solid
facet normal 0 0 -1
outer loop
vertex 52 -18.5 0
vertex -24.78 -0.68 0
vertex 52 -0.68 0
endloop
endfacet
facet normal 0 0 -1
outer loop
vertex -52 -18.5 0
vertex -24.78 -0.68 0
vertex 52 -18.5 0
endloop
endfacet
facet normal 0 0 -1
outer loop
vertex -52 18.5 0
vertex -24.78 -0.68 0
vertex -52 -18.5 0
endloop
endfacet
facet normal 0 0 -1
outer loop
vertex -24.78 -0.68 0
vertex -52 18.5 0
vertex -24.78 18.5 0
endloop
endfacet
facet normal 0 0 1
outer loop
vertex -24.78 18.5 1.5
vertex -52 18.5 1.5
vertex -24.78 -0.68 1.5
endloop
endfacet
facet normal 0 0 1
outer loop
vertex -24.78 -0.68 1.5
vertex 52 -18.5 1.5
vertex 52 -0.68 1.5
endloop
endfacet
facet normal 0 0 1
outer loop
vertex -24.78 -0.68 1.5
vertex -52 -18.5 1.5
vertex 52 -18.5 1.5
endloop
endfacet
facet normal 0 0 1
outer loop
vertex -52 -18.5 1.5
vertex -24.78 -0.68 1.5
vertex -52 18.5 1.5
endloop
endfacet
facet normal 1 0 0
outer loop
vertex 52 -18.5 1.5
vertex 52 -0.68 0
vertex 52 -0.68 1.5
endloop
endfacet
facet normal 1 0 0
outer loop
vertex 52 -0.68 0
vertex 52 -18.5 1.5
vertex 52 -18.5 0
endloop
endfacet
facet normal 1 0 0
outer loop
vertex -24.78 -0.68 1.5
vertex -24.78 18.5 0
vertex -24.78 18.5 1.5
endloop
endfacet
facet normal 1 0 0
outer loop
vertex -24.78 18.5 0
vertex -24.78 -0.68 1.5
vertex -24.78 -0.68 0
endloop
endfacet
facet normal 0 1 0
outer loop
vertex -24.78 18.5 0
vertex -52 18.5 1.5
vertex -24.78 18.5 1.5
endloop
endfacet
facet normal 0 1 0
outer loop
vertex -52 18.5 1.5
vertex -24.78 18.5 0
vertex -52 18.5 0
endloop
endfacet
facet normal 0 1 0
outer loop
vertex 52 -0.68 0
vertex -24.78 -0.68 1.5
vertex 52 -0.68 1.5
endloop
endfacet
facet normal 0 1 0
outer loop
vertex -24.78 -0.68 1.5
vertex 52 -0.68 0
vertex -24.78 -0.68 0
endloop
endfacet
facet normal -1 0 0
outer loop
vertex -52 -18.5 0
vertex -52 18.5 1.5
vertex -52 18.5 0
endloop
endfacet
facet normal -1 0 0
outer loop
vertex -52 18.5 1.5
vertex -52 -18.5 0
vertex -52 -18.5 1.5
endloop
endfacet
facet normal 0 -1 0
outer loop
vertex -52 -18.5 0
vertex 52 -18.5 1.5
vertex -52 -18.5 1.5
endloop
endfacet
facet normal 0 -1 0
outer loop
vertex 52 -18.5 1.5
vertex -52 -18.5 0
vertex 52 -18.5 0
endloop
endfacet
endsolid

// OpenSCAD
// file: BOSL2/std.scad
// Minimal BOSL2 compatibility shim for bundled gallery models.
// It implements only the helpers used by the imported OpenSCAD projects.

CENTER = [0, 0, 0];
BOTTOM = [0, 0, -1];
TOP = [0, 0, 1];
LEFT = [-1, 0, 0];
RIGHT = [1, 0, 0];
FRONT = [0, -1, 0];
BACK = [0, 1, 0];

module up(z=0) {
    translate([0, 0, z]) children();
}

module down(z=0) {
    translate([0, 0, -z]) children();
}

module attach(anchor=CENTER) {
    children();
}

module cuboid(size=[1, 1, 1], anchor=CENTER) {
    center = anchor == CENTER;
    translate(center ? [0, 0, 0] : [0, 0, size[2] / 2])
        cube(size, center=true);
    children();
}

module xcyl(h=1, r=1, anchor=CENTER) {
    center = anchor == CENTER;
    translate(center ? [0, 0, 0] : [h / 2, 0, 0])
        rotate([0, 90, 0])
            cylinder(h=h, r=r, center=true);
}
// main file
include <BOSL2/std.scad>

// Start config
// Panel Size
panel_size = [ 104, 37 ]; // mm
// Pi Board
pi_board_size = [ 51, 21 ];                                        // mm
pi_board_screw_holes_center_from_board_edge_distance = [ 2, 4.8 ]; // mm
pi_board_screw_holes_diameter = 2.1;                               // mm
pi_board_offset = [ 1.75, -1.0 ];
pi_board_usb_size = [ 8.5, 4.5 ];
pi_board_usb_rounding_radius = 0.5; // mm
// pi_board_inset_depth = 0.2; //mm (keep at zero for final)

// Screen
screen_pcb_size = [ 100.5, 33.5, 13.3 ];                                // mm (+- 0.2) 13.3mm are pin headers.
screen_pcb_screw_holes_center_from_board_edge_distance = [ 2.25, 2.5 ]; // mm
screen_pcb_screw_holes_diameter = 2.8;                                  // mm
screen_pcb_screw_holes_spacing = [ 95, 28.5 ];                          // mm
active_screen_area = [ 76.78, 19.18 ];                                  // mm (old: 13.86)
active_screen_area_offset_from_corner = [ 11.36, 5.1 ];                 // mm
screen_rounding_radius = 0.5;                                           // mm
screen_count = 1;

// Screws
m2_screw_head_depth = 1;      // mm it's 2mm normally
m2_screw_head_diameter = 4.0; // mm (adding .6mm for tolerances)
m2_screw_nut_depth = 1;       // mm it's 1.6mm normally
m2_screw_nut_diameter = 5.0;  // mm (adding .6mm for tolerances)
m2_screw_diameter = 2.4;      // mm

// Asanoha
back_asanoha_pattern_repeat = [ 9, 3 ]; // mm
asanoha_area_rounding_radius = 3;       // mm

// Stand
stand_size = [ 3, 6, 6 ];
stand_rounding_radius = 1.5;                // mm
stand_hinge_ball_diameter = 2;              // mm
stand_hinge_ball_offset = 0;                // mm
stand_panel_tolerance = 0.25;               // mm
stand_panel_thickness = 1.5;                // mm
stand_panel_rounding_radius = 1.5;          // mm
stand_asanoha_pattern_unit_length = 10.175; // mm
stand_asanoha_repeat = [ 9, 3 ];

// Misc
walls_depth = 9.5;     // mm
walls_thickness = 1.5; // mm
panel_thickness = 1.5; // mm
rounding_radius = 1.5; // mm

resolution = 80;
// End config

module panel()
{
    cuboid([ panel_size.x, panel_size.y, panel_thickness ], rounding = rounding_radius,
           edges = [ FRONT + RIGHT, FRONT + LEFT, BACK + RIGHT, BACK + LEFT ], $fn = resolution,
           anchor = LEFT + BOTTOM + FRONT);
}

module screw_hole(thread_depth = 10, head_depth = 1.5, head_diameter = 2, thread_diameter = 1.5)
{
    translate([ 0, 0, panel_thickness - thread_depth / 2 - head_depth ])
        cylinder(h = thread_depth, r = thread_diameter / 2, center = true, $fn = resolution);
    translate([ 0, 0, panel_thickness - head_depth / 2 ])
        cylinder(h = head_depth, r = head_diameter / 2, center = true, $fn = resolution);
}

module screen_screw_set()
{
    translate([ 0, 0 ])
        screw_hole(thread_depth = panel_thickness - m2_screw_head_depth, head_depth = m2_screw_head_depth,
                   head_diameter = m2_screw_head_diameter, thread_diameter = m2_screw_diameter);
    translate([ screen_pcb_screw_holes_spacing.x, 0, 0 ])
        screw_hole(thread_depth = panel_thickness - m2_screw_head_depth, head_depth = m2_screw_head_depth,
                   head_diameter = m2_screw_head_diameter, thread_diameter = m2_screw_diameter);
    translate([ 0, screen_pcb_screw_holes_spacing.y, 0 ])
        screw_hole(thread_depth = panel_thickness - m2_screw_head_depth, head_depth = m2_screw_head_depth,
                   head_diameter = m2_screw_head_diameter, thread_diameter = m2_screw_diameter);
    translate([ screen_pcb_screw_holes_spacing.x, screen_pcb_screw_holes_spacing.y, 0 ])
        screw_hole(thread_depth = panel_thickness - m2_screw_head_depth, head_depth = m2_screw_head_depth,
                   head_diameter = m2_screw_head_diameter, thread_diameter = m2_screw_diameter);
}

module screens()
{
    screen_x_size = screen_count == 1 ? active_screen_area.x : screen_pcb_size.x;
    screen_anchor_coords =
        [ panel_size.x / 2 - screen_x_size / 2 * screen_count, panel_size.y / 2 - active_screen_area.y / 2, 0 ];
    pcb_anchor_coords = [ screen_anchor_coords.x - active_screen_area_offset_from_corner.x, screen_anchor_coords.y, 0 ];
    screw_dist = screen_pcb_screw_holes_center_from_board_edge_distance.y + screen_pcb_screw_holes_spacing.y -
                 active_screen_area_offset_from_corner.y - active_screen_area.y;
    screw_anchor_coords = [
        pcb_anchor_coords.x + screen_pcb_screw_holes_center_from_board_edge_distance.x,
        pcb_anchor_coords.y - screw_dist, 0
    ];
    translate(screen_anchor_coords)
        cuboid([ screen_x_size * screen_count, active_screen_area.y, panel_thickness ],
               rounding = screen_rounding_radius, edges = [ FRONT + RIGHT, FRONT + LEFT, BACK + RIGHT, BACK + LEFT ],
               $fn = resolution, anchor = LEFT + BOTTOM + FRONT);
    for (i = [0:screen_count - 1])
    {
        translate(screw_anchor_coords) translate([ screen_x_size * i, 0, 0 ]) screen_screw_set();
    }
}

difference()
{
    panel();
    screens();
}
